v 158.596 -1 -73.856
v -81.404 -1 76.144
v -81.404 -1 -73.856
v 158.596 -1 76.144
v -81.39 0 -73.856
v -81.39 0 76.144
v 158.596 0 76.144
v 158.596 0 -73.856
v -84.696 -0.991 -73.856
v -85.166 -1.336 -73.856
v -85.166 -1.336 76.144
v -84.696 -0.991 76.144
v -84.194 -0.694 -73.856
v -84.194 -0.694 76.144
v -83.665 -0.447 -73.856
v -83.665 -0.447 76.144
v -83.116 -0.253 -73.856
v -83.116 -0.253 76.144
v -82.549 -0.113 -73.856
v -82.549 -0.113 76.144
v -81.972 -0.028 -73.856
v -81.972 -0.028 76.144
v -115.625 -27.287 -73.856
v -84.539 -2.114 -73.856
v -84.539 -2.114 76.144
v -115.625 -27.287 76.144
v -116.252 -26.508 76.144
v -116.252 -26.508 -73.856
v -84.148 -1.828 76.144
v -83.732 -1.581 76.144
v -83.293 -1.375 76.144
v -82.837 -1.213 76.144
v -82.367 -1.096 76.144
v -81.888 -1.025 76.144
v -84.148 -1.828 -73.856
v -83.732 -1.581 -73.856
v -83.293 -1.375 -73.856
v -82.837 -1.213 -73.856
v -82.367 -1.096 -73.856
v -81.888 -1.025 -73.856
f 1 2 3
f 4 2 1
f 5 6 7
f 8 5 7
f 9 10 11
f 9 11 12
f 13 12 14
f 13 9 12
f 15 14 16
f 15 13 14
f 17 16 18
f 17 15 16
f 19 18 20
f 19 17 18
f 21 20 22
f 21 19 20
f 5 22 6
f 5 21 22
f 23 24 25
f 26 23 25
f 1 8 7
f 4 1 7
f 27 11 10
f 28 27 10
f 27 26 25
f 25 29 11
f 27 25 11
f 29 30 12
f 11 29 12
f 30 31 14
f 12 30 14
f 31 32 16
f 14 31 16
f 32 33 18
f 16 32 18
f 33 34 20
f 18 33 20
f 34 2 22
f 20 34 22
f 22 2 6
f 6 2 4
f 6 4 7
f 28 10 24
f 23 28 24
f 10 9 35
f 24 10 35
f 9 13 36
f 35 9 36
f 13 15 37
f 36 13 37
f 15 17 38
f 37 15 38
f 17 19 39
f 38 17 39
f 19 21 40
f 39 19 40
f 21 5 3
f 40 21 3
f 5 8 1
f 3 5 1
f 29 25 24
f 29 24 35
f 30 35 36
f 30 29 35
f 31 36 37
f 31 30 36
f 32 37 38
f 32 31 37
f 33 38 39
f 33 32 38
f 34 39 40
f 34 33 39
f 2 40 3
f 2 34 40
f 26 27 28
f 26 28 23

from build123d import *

# Parameters (mm, degrees)
F0_W     = 240
F0_H     = 150
F1_DEPTH = 1
F4_W     = 1
F4_H     = 150


with BuildPart() as f1:
    # F0 (on Front) → F1 (new body)
    with BuildSketch(Plane.XZ):
        with Locations((38.595604, 1.143629)):
            Rectangle(F0_W, F0_H)
    extrude(amount=F1_DEPTH)

    # F5: sweep along a path in F3
    with BuildLine(Plane(origin=(0, 0, -73.856371), x_dir=(1, 0, 0), z_dir=(0, 0, -1))) as f5_path:
        Line((-115.624746, 27.287086), (-84.538908, 2.11427))
        ThreePointArc((-84.538908, 2.11427), (-83.06134, 1.286793), (-81.392306, 1))
    # F4 (on face) → F5 (sweep)
    with BuildSketch(Plane(origin=(-81.404396, 0, 0), x_dir=(0, -1, 0), z_dir=(-1, 0, 0))):
        with Locations((0.5, 1.143629)):
            Rectangle(F4_W, F4_H)
    sweep(path=f5_path.line)


solid = f1.part
